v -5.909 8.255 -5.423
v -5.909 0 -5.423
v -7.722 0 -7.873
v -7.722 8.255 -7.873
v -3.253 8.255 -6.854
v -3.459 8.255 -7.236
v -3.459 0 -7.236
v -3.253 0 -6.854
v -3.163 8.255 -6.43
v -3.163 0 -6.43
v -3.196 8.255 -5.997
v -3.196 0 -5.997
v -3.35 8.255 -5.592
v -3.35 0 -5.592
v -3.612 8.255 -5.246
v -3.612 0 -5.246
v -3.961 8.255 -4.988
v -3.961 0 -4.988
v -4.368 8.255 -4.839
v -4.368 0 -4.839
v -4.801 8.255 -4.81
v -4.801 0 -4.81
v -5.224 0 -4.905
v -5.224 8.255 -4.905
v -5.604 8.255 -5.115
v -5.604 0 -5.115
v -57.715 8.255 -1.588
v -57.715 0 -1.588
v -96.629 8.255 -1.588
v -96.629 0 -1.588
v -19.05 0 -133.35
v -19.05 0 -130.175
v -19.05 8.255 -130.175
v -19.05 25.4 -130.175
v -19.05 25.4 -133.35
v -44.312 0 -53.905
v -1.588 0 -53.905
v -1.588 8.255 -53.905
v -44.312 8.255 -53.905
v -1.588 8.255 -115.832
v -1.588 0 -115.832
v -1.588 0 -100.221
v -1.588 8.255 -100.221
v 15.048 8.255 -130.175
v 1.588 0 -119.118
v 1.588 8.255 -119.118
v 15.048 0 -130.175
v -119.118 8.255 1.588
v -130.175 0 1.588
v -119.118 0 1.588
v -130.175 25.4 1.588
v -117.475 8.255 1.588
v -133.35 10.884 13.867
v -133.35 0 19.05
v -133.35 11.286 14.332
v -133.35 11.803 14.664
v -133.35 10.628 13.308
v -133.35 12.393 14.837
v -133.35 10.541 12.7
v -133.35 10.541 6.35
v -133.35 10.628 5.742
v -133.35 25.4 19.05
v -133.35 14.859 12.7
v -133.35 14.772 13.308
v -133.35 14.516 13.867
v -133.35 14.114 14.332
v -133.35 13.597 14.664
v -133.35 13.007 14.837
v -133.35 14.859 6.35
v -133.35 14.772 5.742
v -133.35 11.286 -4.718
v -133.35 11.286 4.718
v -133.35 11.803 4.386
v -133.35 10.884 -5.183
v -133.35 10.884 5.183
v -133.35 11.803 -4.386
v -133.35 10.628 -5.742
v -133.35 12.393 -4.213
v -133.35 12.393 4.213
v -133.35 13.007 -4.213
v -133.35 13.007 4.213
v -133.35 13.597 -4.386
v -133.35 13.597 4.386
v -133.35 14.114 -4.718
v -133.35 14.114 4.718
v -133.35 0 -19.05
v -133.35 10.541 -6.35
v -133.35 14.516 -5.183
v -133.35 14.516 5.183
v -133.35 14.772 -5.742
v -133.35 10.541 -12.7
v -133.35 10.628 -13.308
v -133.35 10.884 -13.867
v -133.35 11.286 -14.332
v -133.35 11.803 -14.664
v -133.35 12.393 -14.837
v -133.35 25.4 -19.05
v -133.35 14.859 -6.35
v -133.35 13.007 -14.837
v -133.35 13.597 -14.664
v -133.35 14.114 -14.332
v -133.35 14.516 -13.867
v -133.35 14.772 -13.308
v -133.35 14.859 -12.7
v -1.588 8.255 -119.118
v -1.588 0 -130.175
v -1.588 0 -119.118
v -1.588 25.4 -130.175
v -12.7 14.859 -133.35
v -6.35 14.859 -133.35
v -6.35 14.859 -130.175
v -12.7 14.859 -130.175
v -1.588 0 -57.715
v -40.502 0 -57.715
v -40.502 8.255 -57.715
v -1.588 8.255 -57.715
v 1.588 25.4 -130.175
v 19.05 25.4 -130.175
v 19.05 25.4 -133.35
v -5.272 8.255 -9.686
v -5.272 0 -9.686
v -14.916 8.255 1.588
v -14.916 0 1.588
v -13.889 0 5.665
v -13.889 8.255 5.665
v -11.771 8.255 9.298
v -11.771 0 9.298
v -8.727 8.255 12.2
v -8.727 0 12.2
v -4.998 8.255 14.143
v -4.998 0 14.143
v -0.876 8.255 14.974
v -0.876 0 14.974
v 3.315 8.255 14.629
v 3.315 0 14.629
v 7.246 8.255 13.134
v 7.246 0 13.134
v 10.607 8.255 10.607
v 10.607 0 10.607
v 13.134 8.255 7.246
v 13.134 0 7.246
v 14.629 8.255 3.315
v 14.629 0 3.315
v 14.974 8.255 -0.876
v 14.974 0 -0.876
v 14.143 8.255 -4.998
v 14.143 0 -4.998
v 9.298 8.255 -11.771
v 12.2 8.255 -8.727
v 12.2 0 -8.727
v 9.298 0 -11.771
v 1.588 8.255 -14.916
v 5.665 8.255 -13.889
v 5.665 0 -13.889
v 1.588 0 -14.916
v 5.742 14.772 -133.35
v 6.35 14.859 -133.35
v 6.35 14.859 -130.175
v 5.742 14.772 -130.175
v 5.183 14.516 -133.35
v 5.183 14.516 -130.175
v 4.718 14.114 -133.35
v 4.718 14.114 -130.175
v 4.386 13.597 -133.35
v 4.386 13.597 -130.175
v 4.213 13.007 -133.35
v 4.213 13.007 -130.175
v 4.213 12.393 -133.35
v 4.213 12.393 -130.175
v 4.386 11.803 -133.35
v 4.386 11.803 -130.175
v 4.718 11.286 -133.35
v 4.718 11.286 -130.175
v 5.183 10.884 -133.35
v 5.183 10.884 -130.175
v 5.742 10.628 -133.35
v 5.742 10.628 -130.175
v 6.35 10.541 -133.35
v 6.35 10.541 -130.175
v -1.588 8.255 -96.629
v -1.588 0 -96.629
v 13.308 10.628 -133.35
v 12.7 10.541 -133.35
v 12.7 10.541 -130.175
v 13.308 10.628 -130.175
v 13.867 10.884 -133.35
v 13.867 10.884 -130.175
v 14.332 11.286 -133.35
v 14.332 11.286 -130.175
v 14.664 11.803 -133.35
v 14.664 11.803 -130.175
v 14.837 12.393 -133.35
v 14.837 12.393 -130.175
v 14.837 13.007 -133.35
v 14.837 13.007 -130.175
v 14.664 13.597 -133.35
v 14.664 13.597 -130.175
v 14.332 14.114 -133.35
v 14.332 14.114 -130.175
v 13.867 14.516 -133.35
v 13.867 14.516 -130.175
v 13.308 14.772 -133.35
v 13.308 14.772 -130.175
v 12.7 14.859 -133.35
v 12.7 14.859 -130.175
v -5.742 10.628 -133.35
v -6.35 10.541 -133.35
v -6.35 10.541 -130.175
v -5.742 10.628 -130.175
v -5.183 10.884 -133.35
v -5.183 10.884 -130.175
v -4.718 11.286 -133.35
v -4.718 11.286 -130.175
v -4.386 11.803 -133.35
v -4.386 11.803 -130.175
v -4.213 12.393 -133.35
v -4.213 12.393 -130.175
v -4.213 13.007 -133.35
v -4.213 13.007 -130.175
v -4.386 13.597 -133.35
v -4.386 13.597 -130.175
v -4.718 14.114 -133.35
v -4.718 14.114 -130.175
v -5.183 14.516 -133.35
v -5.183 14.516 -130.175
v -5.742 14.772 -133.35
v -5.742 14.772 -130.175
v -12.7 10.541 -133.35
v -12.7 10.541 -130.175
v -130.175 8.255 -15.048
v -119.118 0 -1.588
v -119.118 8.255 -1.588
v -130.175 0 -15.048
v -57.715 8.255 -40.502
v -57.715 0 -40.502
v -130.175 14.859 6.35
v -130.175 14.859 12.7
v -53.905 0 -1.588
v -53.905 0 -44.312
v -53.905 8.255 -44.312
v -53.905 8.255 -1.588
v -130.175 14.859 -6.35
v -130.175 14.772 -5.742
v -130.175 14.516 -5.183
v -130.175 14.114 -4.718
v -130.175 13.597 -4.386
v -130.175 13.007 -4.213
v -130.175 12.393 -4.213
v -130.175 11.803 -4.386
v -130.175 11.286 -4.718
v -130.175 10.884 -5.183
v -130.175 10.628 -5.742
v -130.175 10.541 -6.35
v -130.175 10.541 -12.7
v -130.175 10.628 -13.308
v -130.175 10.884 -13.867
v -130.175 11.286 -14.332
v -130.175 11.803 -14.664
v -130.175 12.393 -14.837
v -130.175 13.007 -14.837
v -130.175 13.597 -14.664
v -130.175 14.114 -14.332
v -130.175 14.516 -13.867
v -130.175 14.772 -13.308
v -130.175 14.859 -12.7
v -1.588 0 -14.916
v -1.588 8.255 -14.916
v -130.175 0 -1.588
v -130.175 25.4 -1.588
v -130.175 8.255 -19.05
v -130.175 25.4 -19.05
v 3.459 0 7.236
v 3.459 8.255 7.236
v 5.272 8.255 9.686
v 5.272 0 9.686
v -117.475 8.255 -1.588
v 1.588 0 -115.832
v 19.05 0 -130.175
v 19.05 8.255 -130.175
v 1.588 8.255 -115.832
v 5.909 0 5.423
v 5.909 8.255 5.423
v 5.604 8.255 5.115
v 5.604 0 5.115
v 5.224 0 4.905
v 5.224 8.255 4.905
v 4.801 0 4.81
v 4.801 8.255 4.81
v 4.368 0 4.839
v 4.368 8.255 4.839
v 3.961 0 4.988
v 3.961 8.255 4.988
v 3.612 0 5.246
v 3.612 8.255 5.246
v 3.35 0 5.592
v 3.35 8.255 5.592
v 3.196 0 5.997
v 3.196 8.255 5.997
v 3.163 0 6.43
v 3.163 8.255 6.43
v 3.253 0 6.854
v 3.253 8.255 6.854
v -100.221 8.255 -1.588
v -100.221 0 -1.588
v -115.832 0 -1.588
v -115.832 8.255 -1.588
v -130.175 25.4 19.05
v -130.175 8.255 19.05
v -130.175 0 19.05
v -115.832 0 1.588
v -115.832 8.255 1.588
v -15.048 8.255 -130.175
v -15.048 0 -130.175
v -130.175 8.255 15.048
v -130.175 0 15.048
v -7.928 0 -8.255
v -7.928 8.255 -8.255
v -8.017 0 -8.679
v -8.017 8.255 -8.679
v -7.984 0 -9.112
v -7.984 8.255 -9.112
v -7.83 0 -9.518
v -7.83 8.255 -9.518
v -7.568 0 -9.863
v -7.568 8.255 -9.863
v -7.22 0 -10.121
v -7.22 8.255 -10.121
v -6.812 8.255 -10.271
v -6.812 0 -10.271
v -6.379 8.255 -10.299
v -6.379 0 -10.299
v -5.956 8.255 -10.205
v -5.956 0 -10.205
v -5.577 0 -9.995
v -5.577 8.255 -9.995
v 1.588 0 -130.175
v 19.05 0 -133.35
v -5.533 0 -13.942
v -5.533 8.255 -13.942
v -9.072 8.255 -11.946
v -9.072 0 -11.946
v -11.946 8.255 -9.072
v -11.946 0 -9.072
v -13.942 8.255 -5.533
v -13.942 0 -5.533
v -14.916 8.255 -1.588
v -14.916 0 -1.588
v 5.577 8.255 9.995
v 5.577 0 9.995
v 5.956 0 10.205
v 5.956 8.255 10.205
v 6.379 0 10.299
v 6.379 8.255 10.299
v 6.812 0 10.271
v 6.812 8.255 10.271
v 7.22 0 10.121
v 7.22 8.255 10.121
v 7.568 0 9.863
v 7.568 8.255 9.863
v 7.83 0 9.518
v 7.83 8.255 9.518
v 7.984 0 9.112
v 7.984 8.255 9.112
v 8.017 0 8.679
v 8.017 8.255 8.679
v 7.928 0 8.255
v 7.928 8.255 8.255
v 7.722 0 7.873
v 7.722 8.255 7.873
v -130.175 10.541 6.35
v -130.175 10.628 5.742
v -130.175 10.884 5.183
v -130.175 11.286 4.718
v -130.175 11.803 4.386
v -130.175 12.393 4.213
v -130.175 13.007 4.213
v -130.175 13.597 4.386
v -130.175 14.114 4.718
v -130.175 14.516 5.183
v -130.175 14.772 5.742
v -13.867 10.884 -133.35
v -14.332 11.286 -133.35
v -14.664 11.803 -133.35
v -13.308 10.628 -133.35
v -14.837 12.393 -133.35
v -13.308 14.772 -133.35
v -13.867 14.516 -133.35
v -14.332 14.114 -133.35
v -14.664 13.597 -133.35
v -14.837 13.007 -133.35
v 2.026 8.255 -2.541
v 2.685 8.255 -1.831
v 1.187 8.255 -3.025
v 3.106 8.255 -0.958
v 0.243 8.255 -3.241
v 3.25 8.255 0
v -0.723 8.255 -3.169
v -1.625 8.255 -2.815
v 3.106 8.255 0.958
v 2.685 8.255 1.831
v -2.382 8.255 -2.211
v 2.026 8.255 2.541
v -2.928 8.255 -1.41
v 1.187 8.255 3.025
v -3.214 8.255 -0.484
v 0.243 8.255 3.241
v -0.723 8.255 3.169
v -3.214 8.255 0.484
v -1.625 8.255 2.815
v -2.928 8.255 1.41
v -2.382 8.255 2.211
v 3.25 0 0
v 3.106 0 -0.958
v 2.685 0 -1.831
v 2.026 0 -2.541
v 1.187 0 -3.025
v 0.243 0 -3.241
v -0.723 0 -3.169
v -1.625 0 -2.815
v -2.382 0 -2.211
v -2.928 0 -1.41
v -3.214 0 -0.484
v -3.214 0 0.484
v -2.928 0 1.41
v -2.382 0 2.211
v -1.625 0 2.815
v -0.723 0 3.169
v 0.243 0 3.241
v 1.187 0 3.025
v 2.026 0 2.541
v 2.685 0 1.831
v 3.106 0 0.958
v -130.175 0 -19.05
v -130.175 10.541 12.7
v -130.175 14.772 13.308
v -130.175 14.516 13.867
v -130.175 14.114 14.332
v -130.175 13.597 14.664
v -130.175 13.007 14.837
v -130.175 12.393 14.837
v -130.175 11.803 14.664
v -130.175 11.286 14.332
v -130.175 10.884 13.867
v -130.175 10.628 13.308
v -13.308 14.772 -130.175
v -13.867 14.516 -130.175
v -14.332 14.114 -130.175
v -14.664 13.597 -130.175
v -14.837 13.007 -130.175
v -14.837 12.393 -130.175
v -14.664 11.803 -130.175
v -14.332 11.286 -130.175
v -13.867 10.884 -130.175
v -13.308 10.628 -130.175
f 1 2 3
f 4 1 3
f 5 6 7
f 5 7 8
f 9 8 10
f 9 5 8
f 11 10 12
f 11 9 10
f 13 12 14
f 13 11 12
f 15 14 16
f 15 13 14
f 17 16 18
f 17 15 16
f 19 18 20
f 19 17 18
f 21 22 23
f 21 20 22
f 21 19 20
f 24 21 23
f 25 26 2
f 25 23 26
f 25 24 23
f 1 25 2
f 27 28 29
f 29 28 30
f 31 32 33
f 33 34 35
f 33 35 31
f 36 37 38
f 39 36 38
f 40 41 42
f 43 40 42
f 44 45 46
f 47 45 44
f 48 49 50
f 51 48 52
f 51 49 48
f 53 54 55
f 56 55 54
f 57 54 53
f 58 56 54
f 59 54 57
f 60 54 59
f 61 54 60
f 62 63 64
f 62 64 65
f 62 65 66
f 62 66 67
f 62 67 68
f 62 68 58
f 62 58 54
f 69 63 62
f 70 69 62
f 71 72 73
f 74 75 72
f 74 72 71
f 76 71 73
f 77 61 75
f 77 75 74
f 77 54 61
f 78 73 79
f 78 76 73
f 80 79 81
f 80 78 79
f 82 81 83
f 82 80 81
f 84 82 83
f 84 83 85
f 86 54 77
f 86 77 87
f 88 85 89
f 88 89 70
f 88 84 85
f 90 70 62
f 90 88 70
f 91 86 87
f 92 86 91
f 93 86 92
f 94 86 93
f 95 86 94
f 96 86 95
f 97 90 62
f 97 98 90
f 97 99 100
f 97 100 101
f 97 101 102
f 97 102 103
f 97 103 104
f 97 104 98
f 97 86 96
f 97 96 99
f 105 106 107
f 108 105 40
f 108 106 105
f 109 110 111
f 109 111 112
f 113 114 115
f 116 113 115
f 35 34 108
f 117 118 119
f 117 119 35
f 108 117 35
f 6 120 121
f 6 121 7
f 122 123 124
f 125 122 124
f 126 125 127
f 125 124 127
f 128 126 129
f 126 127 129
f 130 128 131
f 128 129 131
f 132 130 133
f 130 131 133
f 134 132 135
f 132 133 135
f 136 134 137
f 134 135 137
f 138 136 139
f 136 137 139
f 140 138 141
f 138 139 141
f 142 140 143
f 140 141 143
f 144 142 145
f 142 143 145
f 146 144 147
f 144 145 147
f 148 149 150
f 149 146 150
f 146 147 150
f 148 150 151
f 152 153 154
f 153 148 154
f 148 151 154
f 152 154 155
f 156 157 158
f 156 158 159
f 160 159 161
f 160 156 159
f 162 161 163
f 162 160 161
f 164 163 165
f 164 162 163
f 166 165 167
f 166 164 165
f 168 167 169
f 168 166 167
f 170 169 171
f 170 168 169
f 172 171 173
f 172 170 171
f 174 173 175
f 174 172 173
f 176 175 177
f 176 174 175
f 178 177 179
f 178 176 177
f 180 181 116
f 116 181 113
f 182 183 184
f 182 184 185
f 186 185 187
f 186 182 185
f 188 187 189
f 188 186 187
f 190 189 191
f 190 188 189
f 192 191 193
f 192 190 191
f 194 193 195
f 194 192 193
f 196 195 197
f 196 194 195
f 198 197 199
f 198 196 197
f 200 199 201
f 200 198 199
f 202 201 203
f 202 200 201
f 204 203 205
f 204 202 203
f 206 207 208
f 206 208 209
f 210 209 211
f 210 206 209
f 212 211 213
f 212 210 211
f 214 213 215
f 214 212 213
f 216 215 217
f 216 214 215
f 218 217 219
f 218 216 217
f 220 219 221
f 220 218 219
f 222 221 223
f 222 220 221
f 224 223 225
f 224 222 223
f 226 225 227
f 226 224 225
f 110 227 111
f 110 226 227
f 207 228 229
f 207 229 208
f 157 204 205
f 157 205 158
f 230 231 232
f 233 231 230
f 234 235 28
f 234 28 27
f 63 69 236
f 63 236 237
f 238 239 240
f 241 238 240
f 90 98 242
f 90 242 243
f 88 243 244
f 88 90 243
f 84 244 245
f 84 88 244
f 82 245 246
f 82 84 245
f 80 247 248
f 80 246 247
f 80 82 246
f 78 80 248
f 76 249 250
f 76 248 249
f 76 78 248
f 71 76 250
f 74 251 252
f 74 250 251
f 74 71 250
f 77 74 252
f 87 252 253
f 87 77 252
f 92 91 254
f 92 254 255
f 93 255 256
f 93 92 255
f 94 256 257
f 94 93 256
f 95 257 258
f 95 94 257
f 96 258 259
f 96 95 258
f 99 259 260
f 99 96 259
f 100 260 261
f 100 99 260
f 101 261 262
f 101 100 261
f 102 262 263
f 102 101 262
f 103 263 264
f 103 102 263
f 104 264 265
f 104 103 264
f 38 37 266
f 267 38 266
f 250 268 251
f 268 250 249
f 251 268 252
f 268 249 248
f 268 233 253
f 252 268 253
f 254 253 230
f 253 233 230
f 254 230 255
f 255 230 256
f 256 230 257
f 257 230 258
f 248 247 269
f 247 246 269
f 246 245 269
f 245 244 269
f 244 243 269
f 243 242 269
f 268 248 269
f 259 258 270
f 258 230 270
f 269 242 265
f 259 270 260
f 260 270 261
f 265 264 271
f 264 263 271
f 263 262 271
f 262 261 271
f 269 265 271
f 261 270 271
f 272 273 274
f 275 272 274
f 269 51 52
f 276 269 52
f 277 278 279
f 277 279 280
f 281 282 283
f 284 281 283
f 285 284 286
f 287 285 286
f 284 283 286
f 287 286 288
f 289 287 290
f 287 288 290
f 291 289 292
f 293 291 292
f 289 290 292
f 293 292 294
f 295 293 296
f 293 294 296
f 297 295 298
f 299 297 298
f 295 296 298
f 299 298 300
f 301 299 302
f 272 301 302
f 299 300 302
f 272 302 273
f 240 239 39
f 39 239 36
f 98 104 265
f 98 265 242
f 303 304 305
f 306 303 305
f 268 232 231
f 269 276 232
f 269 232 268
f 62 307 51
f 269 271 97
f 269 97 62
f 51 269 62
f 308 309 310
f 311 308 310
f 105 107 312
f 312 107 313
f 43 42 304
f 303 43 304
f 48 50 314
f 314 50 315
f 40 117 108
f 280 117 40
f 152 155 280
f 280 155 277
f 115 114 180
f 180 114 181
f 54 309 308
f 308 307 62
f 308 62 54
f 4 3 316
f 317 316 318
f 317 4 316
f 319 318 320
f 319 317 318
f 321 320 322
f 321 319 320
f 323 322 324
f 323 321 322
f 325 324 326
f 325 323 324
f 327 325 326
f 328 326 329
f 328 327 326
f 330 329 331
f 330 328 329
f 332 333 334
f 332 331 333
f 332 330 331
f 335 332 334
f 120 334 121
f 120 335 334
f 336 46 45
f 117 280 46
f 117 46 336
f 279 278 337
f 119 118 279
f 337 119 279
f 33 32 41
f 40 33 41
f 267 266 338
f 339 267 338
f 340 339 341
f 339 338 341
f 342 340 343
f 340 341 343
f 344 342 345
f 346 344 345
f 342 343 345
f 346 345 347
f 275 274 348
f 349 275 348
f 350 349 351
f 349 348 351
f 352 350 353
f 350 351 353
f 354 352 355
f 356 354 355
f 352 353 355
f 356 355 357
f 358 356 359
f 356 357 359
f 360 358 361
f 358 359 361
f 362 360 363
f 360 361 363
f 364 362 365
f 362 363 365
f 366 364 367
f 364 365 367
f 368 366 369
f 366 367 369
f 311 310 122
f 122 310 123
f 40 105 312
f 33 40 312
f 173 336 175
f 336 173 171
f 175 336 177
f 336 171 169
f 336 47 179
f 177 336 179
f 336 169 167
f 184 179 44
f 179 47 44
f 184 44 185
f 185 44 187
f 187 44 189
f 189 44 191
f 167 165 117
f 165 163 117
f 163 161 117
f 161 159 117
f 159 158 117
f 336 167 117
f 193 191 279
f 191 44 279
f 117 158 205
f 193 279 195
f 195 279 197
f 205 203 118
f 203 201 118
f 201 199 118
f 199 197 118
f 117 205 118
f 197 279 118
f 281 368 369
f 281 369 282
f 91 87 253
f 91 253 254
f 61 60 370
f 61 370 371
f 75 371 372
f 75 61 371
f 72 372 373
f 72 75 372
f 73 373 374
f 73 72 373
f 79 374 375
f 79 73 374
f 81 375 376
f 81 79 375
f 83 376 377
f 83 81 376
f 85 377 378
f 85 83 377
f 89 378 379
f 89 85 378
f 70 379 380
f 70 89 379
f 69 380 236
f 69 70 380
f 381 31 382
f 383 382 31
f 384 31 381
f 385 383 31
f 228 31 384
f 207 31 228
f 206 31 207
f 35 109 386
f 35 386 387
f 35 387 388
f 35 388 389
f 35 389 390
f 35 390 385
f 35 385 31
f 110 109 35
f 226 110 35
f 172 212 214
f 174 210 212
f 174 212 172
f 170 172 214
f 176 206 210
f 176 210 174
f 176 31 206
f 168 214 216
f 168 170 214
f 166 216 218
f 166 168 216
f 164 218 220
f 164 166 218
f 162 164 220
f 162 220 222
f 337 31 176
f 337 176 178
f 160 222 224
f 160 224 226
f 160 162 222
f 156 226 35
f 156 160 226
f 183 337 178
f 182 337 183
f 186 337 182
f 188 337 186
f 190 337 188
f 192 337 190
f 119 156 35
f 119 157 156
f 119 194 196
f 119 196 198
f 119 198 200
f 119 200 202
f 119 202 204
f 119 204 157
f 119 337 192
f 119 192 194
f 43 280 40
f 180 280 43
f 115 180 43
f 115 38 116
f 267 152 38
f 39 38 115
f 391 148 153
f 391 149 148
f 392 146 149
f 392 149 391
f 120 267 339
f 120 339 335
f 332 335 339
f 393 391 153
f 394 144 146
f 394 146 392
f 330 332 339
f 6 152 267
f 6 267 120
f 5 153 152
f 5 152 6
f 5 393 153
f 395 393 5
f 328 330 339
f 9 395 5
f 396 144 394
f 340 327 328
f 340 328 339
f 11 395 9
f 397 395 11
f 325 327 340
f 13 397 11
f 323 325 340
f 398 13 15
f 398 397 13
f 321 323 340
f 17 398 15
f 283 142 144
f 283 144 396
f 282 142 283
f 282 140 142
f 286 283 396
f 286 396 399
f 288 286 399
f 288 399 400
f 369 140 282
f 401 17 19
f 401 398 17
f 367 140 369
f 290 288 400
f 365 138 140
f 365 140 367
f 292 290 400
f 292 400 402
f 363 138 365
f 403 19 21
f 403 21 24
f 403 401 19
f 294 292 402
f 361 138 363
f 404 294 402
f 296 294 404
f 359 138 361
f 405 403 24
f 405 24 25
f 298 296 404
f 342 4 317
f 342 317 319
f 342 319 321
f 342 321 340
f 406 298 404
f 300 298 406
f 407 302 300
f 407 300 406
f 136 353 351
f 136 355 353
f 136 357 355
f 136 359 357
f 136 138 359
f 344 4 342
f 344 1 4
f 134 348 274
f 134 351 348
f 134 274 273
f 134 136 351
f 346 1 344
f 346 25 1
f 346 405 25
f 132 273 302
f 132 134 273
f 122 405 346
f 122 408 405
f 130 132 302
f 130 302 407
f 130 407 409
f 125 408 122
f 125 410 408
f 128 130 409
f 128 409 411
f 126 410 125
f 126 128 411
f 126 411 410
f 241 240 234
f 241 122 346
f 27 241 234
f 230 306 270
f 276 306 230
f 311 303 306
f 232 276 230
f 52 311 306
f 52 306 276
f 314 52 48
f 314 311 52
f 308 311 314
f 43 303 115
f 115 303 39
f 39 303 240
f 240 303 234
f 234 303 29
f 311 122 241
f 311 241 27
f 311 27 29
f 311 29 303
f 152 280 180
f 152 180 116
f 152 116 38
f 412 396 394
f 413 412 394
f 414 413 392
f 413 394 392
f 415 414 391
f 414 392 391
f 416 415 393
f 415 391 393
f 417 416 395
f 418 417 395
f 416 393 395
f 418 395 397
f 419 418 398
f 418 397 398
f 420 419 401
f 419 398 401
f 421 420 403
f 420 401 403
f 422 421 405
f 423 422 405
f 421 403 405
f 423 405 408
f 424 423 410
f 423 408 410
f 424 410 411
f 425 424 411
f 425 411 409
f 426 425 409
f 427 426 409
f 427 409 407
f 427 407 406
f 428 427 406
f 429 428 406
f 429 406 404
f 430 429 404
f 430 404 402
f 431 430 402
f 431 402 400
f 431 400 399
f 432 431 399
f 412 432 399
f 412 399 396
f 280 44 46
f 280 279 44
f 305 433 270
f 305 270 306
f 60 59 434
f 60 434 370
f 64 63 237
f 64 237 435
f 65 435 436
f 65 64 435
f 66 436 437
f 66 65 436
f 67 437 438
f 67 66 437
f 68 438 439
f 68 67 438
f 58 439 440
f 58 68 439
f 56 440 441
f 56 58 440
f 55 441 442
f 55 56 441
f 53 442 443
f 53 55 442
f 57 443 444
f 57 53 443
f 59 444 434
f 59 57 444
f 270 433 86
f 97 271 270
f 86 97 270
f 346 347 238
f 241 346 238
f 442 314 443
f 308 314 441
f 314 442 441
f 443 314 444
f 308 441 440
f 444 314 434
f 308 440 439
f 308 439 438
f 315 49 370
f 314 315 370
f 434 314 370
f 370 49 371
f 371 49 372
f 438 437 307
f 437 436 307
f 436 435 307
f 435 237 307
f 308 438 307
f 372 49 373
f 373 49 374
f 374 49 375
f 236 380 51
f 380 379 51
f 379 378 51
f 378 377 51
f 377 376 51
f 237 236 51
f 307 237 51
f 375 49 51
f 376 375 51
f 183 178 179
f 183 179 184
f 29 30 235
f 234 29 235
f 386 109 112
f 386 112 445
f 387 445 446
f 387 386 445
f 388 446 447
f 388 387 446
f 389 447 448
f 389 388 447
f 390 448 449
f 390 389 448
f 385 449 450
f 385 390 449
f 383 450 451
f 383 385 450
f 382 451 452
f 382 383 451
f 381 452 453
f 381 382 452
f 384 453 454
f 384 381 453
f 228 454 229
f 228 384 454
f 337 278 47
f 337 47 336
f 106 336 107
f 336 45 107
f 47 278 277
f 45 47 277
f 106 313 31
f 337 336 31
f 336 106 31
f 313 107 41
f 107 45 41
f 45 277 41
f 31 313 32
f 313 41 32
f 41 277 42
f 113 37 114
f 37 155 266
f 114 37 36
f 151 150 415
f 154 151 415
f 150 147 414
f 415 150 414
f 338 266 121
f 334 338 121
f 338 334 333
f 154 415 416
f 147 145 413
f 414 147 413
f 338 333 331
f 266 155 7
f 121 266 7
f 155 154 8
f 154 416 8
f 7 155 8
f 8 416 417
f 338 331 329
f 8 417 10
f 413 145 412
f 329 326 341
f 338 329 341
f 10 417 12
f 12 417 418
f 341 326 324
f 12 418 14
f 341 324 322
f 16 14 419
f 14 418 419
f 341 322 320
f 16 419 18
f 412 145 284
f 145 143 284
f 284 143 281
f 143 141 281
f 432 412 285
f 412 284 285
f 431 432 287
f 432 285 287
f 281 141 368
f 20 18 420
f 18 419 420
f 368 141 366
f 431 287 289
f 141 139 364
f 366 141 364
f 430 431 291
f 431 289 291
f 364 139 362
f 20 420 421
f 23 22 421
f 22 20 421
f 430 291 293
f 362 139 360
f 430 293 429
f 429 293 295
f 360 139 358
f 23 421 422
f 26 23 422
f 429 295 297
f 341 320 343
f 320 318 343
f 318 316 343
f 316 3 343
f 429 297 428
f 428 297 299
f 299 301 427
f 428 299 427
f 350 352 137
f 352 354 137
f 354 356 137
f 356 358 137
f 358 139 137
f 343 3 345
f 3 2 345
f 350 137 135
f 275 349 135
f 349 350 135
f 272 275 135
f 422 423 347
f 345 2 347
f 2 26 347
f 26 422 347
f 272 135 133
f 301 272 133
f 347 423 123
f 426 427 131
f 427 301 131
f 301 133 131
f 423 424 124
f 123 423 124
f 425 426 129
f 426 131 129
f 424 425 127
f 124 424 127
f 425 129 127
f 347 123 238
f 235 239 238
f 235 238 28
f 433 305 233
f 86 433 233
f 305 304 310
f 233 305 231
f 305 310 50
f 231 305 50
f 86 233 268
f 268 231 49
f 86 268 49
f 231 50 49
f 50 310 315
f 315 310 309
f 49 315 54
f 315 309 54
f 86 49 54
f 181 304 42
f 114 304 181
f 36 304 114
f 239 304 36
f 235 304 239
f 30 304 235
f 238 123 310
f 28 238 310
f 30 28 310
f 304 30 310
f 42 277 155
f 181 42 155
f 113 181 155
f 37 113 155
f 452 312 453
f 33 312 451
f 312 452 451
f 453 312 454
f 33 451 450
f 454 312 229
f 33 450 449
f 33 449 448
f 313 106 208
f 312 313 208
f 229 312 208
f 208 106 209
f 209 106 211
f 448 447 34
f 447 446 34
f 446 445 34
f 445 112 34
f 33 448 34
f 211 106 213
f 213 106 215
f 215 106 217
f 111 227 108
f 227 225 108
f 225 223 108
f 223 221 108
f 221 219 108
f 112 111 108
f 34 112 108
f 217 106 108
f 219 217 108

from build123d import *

# Parameters (mm, degrees)
SKETCH1_R                       = 15
BOSS_EXTRUDE2_DEPTH             = 8.255
BOSS_EXTRUDE3_DEPTH             = 8.255
SKETCH5_R                       = 3.249999977
CUT_EXTRUDE3_DEPTH              = 63.5
SKETCH7_W                       = 3.175
SKETCH7_H                       = 25.4
BOSS_EXTRUDE5_DEPTH             = 19.05
CUT_EXTRUDE6_DEPTH              = 149.35
CIRPATTERN2_COUNT               = 2
CIRPATTERN2_ANGLE               = 90
CIRPATTERN3_COUNT               = 2
CIRPATTERN3_ANGLE               = 90
BOSS_EXTRUDE6_DEPTH             = 8.255
BOSS_EXTRUDE7_REACH             = 21.05
BOSS_EXTRUDE7_DIRECTION_2_REACH = 135.35
BOSS_EXTRUDE8_REACH             = 21.05
BOSS_EXTRUDE8_DIRECTION_2_REACH = 135.35
BOSS_EXTRUDE9_REACH             = 133.763
SKETCH19_W                      = 3.81
SKETCH19_H                      = 8.255
BOSS_EXTRUDE10_REACH            = 133.763
SKETCH20_W                      = 3.81
SKETCH20_H                      = 8.255


with BuildPart() as part:
    # Sketch1 → Boss-Extrude2 (new body)
    with BuildSketch(Plane(origin=(0, 0, 0), x_dir=(1, 0, 0), z_dir=(0, 1, 0))):
        Circle(SKETCH1_R)
    extrude(amount=BOSS_EXTRUDE2_DEPTH)

    # Sketch1<6> → Boss-Extrude3 (add)
    with BuildSketch(Plane(origin=(0, 0, 0), x_dir=(1, 0, 0), z_dir=(0, 1, 0))):
        with BuildLine():
            Line((-1.5875, 130.175), (-1.5875, 14.915758236))
            ThreePointArc((-1.5875, 14.915758236), (0, 15), (1.5875, 14.915758236))
            Line((1.5875, 14.915758236), (1.5875, 130.175))
            Line((1.5875, 130.175), (-1.5875, 130.175))
        make_face()
        with BuildLine():
            ThreePointArc((-14.915758236, -1.5875), (-15, 0), (-14.915758236, 1.5875))
            Line((-14.915758236, 1.5875), (-130.175, 1.5875))
            Line((-130.175, 1.5875), (-130.175, -1.5875))
            Line((-130.175, -1.5875), (-14.915758236, -1.5875))
        make_face()
    extrude(amount=BOSS_EXTRUDE3_DEPTH)

    # Sketch5 → Cut-Extrude3 (cut)
    with BuildSketch(Plane(origin=(0, 8.255, 0), x_dir=(1, 0, 0), z_dir=(0, 1, 0))):
        Circle(SKETCH5_R)
        with BuildLine():
            Line((-5.908712478, 5.423058993), (-7.721732332, 7.873214705))
            ThreePointArc((-7.721732332, 7.873214705), (-7.403164404, 10.004802487), (-5.271576621, 9.686234559))
            Line((-5.271576621, 9.686234559), (-3.458556767, 7.236078848))
            ThreePointArc((-3.458556767, 7.236078848), (-3.777124696, 5.104491065), (-5.908712478, 5.423058993))
        make_face()
        with BuildLine():
            Line((3.458556767, -7.236078848), (5.271576621, -9.686234559))
            ThreePointArc((5.271576621, -9.686234559), (7.403164404, -10.004802487), (7.721732332, -7.873214705))
            Line((7.721732332, -7.873214705), (5.908712478, -5.423058993))
            ThreePointArc((5.908712478, -5.423058993), (3.777124696, -5.104491065), (3.458556767, -7.236078848))
        make_face()
    extrude(amount=-CUT_EXTRUDE3_DEPTH, mode=Mode.SUBTRACT)

    # Sketch7 → Boss-Extrude5 (add, symmetric)
    with BuildSketch(Plane(origin=(0, 0, 0), x_dir=(0, 0, -1), z_dir=(1, 0, 0))):
        with Locations((131.7625, 12.7)):
            Rectangle(SKETCH7_W, SKETCH7_H)
    boss_extrude5 = extrude(amount=BOSS_EXTRUDE5_DEPTH, both=True)

    # Sketch12 → Cut-Extrude6 (cut, through all)
    with BuildSketch(Plane(origin=(0, 0, -133.35), x_dir=(-1, 0, 0), z_dir=(0, 0, -1))):
        with BuildLine():
            Line((-6.35, 10.541), (-12.7, 10.541))
            ThreePointArc((-12.7, 10.541), (-14.859, 12.7), (-12.7, 14.859))
            Line((-12.7, 14.859), (-6.35, 14.859))
            ThreePointArc((-6.35, 14.859), (-4.191, 12.7), (-6.35, 10.541))
        make_face()
        with BuildLine():
            Line((6.35, 14.859), (12.7, 14.859))
            ThreePointArc((12.7, 14.859), (14.859, 12.7), (12.7, 10.541))
            Line((12.7, 10.541), (6.35, 10.541))
            ThreePointArc((6.35, 10.541), (4.191, 12.7), (6.35, 14.859))
        make_face()
    cut_extrude6 = extrude(amount=-CUT_EXTRUDE6_DEPTH, mode=Mode.SUBTRACT)

    # CirPattern2: Boss-Extrude5 ×2 about axis
    cirpattern2_axis = Axis((0, 0, 0), (0, 1, 0))
    for i in range(1, CIRPATTERN2_COUNT):
        add(boss_extrude5.rotate(cirpattern2_axis, i * CIRPATTERN2_ANGLE / (CIRPATTERN2_COUNT - 1)))

    # CirPattern3: Cut-Extrude6 ×2 about axis
    cirpattern3_axis = Axis((0, 0, 0), (0, 1, 0))
    for i in range(1, CIRPATTERN3_COUNT):
        add(cut_extrude6.rotate(cirpattern3_axis, i * CIRPATTERN3_ANGLE / (CIRPATTERN3_COUNT - 1)), mode=Mode.SUBTRACT)

    # Sketch13 → Boss-Extrude6 (add)
    with BuildSketch(Plane.XZ):
        Polygon((-96.628948776, -1.5875), (-1.5875, -96.628948776), (-1.5875, -100.221051224), (-100.221051224, -1.5875), align=None)
        Polygon((-19.05, -130.175), (-1.5875, -115.831500599), (-1.5875, -119.118499401), (-15.048241783, -130.175), align=None)
        Polygon((19.05, -130.175), (1.5875, -115.831500599), (1.5875, -119.118499401), (15.048241783, -130.175), align=None)
        Polygon((-119.118499401, 1.5875), (-130.175, 15.048241783), (-130.175, 19.05), (-115.831500599, 1.5875), align=None)
        Polygon((-119.118499401, -1.5875), (-130.175, -15.048241783), (-130.175, -19.05), (-115.831500599, -1.5875), align=None)
    extrude(amount=-BOSS_EXTRUDE6_DEPTH)

    # Boss-Extrude7: up to this face of the body (flat: up to its plane)
    boss_extrude7_end = Plane(part.part.faces().sort_by_distance((-124.646749701, 4.1275, 1.5875))[0])
    # Sketch14 → Boss-Extrude7 (add, up to the picked face)
    with BuildSketch(Plane.XY, mode=Mode.PRIVATE) as boss_extrude7_sk1:
        Polygon((-130.175, 25.4), (-117.475, 8.255), (-130.175, 8.255), align=None)
    boss_extrude7_tool1 = split(extrude(boss_extrude7_sk1.sketch, amount=BOSS_EXTRUDE7_REACH, mode=Mode.PRIVATE), bisect_by=boss_extrude7_end, keep=Keep.BOTH, mode=Mode.PRIVATE)
    add(boss_extrude7_tool1.solids().sort_by_distance((-125.941667, 13.97, 0))[0])

    # Boss-Extrude7 direction 2: up to this face of the body (flat: up to its plane)
    boss_extrude7_direction_2_end = Plane(part.part.faces().sort_by_distance((-124.646749701, 4.1275, -1.5875))[0])
    # Sketch14 → Boss-Extrude7 direction 2 (add, up to the picked face)
    with BuildSketch(Plane.XY, mode=Mode.PRIVATE) as boss_extrude7_direction_2_sk1:
        Polygon((-130.175, 25.4), (-117.475, 8.255), (-130.175, 8.255), align=None)
    boss_extrude7_direction_2_tool1 = split(extrude(boss_extrude7_direction_2_sk1.sketch, amount=-BOSS_EXTRUDE7_DIRECTION_2_REACH, mode=Mode.PRIVATE), bisect_by=boss_extrude7_direction_2_end, keep=Keep.BOTH, mode=Mode.PRIVATE)
    add(boss_extrude7_direction_2_tool1.solids().sort_by_distance((-125.941667, 13.97, 0))[0])

    # Boss-Extrude8: up to this face of the body (flat: up to its plane)
    boss_extrude8_end = Plane(part.part.faces().sort_by_distance((1.5875, 4.1275, -65.373629417))[0])
    # Sketch15 → Boss-Extrude8 (add, up to the picked face)
    with BuildSketch(Plane(origin=(0, 0, 0), x_dir=(0, 0, -1), z_dir=(1, 0, 0)), mode=Mode.PRIVATE) as boss_extrude8_sk1:
        Polygon((130.175, 25.4), (115.831500599, 8.255), (130.175, 8.255), align=None)
    boss_extrude8_tool1 = split(extrude(boss_extrude8_sk1.sketch, amount=BOSS_EXTRUDE8_REACH, mode=Mode.PRIVATE), bisect_by=boss_extrude8_end, keep=Keep.BOTH, mode=Mode.PRIVATE)
    add(boss_extrude8_tool1.solids().sort_by_distance((0, 13.97, -125.393834))[0])

    # Boss-Extrude8 direction 2: up to this face of the body (flat: up to its plane)
    boss_extrude8_direction_2_end = Plane(part.part.faces().sort_by_distance((-1.5875, 4.1275, -108.026275912))[0])
    # Sketch15 → Boss-Extrude8 direction 2 (add, up to the picked face)
    with BuildSketch(Plane(origin=(0, 0, 0), x_dir=(0, 0, -1), z_dir=(1, 0, 0)), mode=Mode.PRIVATE) as boss_extrude8_direction_2_sk1:
        Polygon((130.175, 25.4), (115.831500599, 8.255), (130.175, 8.255), align=None)
    boss_extrude8_direction_2_tool1 = split(extrude(boss_extrude8_direction_2_sk1.sketch, amount=-BOSS_EXTRUDE8_DIRECTION_2_REACH, mode=Mode.PRIVATE), bisect_by=boss_extrude8_direction_2_end, keep=Keep.BOTH, mode=Mode.PRIVATE)
    add(boss_extrude8_direction_2_tool1.solids().sort_by_distance((0, 13.97, -125.393834))[0])

    # Sketch19 → Boss-Extrude9 (add, up to next)
    with BuildSketch(Plane.ZY.offset(1.5875), mode=Mode.PRIVATE) as boss_extrude9_sk1:
        with Locations((-55.809758236, 4.1275)):
            Rectangle(SKETCH19_W, SKETCH19_H)
    boss_extrude9_tool1 = extrude(boss_extrude9_sk1.sketch, amount=BOSS_EXTRUDE9_REACH, mode=Mode.PRIVATE) - part.part
    add(boss_extrude9_tool1.solids().sort_by_distance((-1.5875, 4.1275, -55.809758))[0])

    # Sketch20 → Boss-Extrude10 (add, up to next)
    with BuildSketch(Plane(origin=(0, 0, -1.5875), x_dir=(-1, 0, 0), z_dir=(0, 0, -1)), mode=Mode.PRIVATE) as boss_extrude10_sk1:
        with Locations((55.809758236, 4.1275)):
            Rectangle(SKETCH20_W, SKETCH20_H)
    boss_extrude10_tool1 = extrude(boss_extrude10_sk1.sketch, amount=BOSS_EXTRUDE10_REACH, mode=Mode.PRIVATE) - part.part
    add(boss_extrude10_tool1.solids().sort_by_distance((-55.809758, 4.1275, -1.5875))[0])


solid = part.part
